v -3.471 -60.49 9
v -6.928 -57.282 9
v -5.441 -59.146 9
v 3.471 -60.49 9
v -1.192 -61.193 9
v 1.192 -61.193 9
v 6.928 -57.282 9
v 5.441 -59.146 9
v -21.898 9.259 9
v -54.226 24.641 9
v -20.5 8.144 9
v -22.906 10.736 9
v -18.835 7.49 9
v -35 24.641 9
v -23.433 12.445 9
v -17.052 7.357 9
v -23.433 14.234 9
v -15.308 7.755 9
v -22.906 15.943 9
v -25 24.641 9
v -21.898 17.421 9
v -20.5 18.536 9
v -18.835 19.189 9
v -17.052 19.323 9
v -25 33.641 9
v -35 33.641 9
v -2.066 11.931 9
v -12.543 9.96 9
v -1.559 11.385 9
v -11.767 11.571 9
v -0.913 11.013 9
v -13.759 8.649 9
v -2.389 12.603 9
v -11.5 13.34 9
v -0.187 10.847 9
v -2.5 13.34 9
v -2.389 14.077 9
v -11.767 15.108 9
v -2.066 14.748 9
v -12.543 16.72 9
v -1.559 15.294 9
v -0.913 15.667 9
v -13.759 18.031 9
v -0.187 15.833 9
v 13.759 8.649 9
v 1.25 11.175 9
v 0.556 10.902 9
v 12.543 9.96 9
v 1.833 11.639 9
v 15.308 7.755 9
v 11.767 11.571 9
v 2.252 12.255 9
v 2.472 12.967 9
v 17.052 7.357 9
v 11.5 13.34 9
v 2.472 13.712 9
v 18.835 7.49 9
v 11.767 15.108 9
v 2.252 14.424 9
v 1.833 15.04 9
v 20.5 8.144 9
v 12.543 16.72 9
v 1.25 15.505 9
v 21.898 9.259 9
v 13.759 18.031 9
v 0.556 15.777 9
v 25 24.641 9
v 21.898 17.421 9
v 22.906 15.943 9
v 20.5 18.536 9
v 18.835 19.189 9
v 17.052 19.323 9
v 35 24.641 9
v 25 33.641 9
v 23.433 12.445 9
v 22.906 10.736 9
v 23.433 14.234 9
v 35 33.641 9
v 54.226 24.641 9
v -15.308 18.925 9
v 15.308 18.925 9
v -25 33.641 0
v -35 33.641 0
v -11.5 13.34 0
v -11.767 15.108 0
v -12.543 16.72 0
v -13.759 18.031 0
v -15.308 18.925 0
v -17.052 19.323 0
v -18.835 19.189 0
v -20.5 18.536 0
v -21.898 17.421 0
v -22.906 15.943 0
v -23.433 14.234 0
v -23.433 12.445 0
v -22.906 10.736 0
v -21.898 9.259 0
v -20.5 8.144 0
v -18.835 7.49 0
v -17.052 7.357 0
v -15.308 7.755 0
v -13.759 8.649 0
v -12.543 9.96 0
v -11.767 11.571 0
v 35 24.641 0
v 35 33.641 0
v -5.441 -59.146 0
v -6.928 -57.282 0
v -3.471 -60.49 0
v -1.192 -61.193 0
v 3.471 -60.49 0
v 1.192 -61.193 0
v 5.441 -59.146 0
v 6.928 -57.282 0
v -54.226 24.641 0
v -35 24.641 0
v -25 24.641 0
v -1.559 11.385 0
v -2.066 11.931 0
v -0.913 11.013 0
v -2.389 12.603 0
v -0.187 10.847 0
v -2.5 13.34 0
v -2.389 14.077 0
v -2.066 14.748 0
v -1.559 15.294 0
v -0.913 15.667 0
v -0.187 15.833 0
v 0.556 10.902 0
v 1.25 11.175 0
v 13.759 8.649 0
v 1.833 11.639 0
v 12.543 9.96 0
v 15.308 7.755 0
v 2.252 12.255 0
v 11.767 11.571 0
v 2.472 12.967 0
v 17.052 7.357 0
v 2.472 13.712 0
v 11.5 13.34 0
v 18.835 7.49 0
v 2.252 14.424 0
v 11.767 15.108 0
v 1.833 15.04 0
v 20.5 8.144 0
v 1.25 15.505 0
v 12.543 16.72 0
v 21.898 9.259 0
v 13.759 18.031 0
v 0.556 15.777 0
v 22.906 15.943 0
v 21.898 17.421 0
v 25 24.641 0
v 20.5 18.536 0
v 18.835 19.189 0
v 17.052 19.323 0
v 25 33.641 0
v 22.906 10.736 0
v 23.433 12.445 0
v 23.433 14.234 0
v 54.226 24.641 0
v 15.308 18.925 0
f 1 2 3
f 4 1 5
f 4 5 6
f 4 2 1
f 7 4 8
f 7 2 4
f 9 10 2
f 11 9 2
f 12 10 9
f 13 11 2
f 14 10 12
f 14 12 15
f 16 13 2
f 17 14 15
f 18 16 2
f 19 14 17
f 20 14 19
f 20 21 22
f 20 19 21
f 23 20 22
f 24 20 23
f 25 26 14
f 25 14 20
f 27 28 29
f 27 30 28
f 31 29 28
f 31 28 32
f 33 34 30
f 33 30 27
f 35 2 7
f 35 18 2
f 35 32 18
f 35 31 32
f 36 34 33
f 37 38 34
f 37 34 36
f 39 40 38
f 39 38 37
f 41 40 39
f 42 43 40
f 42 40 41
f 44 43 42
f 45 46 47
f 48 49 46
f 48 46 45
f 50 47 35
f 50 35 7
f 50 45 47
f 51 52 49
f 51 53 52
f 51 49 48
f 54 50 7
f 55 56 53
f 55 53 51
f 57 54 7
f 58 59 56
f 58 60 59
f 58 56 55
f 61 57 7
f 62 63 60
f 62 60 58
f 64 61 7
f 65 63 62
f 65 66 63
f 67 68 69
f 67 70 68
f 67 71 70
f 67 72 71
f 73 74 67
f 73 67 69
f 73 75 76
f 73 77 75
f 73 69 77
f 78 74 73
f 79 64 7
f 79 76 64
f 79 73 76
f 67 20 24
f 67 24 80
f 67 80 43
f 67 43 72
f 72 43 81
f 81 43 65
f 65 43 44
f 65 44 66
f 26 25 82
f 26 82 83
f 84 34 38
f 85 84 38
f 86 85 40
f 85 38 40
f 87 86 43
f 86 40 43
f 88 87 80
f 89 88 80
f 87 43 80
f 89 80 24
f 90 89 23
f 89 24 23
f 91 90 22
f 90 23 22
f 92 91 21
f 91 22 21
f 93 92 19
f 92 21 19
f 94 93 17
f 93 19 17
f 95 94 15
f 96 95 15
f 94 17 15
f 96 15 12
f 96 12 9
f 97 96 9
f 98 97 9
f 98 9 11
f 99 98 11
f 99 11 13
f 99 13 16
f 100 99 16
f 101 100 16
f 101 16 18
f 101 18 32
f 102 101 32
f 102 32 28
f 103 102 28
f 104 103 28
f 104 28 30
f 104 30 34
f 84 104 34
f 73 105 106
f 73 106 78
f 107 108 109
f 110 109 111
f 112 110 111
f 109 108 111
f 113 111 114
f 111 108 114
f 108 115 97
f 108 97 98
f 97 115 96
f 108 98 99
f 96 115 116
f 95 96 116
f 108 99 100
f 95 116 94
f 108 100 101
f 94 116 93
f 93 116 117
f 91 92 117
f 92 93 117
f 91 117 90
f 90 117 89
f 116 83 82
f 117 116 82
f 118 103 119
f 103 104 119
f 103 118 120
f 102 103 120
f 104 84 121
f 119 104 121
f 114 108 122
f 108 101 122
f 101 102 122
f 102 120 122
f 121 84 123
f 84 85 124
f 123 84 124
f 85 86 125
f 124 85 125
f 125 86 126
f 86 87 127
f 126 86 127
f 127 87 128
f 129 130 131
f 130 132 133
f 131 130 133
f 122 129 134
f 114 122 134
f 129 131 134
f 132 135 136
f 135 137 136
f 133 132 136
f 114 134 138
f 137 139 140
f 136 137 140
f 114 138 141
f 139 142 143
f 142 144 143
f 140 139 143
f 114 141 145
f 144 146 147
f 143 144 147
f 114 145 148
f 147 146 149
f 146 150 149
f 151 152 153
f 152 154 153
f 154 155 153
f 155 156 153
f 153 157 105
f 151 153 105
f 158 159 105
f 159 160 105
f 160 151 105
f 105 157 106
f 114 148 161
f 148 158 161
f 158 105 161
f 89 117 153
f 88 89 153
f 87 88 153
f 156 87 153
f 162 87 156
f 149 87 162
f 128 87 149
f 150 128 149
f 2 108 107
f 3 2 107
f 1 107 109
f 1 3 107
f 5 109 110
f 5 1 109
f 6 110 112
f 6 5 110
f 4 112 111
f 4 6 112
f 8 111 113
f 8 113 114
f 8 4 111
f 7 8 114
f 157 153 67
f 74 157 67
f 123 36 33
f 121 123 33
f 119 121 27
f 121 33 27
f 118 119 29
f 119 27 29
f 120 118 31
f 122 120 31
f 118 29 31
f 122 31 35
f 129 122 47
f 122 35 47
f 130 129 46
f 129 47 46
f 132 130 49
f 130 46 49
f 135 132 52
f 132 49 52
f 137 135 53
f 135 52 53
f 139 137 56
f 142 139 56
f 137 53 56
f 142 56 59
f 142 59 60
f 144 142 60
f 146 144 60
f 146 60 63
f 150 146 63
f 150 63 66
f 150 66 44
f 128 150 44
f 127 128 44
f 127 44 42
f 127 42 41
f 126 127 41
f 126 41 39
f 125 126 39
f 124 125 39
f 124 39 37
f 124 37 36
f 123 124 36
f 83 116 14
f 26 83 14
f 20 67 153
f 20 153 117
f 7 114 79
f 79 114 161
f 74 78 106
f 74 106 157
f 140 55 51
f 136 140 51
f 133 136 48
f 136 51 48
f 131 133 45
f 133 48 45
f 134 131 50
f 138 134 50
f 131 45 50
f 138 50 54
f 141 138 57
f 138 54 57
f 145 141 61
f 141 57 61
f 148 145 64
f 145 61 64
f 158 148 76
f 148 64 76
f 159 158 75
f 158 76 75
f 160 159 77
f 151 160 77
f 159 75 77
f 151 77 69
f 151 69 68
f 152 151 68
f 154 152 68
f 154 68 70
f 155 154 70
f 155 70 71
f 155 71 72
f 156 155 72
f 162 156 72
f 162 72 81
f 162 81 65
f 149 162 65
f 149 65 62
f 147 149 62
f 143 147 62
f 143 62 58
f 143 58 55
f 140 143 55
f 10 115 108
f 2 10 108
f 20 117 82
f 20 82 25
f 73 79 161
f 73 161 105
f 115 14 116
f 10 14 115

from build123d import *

# Parameters (mm, degrees)
F1_DEPTH  = 9
F2_R      = 8
F4_DEPTH  = 25
F5_W      = 120
F5_H      = 9
F6_DEPTH  = 10
F7_W      = 10
F7_H      = 9
F8_DEPTH  = 9
F10_DEPTH = 25


with BuildPart() as f1:
    # F0 (on Top) → F1 (new body)
    with BuildSketch(Plane.XY):
        Polygon((60, 34.6410161514), (-60, 34.6410161514), (0, -69.2820323028), align=None)
    extrude(amount=F1_DEPTH)

    # F2
    f2_edges = [f1.edges().sort_by_distance(p)[0] for p in [
        (0, -69.282032, 4.5),
    ]]
    fillet(f2_edges, radius=F2_R)

    # F3 (on face) → F4 (cut)
    with BuildSketch(Plane.XY.offset(9)):
        with BuildLine():
            Line((11.5, 13.3397459622), (23.5, 13.3397459622))
            ThreePointArc((23.5, 13.3397459622), (17.5, 19.3397459622), (11.5, 13.3397459622))
        make_face()
        with BuildLine():
            ThreePointArc((-23.5, 13.3397459622), (-17.5, 7.3397459622), (-11.5, 13.3397459622))
            Line((-11.5, 13.3397459622), (-23.5, 13.3397459622))
        make_face()
        with BuildLine():
            Line((-23.5, 13.3397459622), (-11.5, 13.3397459622))
            ThreePointArc((-11.5, 13.3397459622), (-17.5, 19.3397459622), (-23.5, 13.3397459622))
        make_face()
        with BuildLine():
            ThreePointArc((11.5, 13.3397459622), (17.5, 7.3397459622), (23.5, 13.3397459622))
            Line((23.5, 13.3397459622), (11.5, 13.3397459622))
        make_face()
    extrude(amount=-F4_DEPTH, mode=Mode.SUBTRACT)

    # F5 (on face) → F6 (cut)
    with BuildSketch(Plane(origin=(0, 34.6410161514, 0), x_dir=(-1, 0, 0), z_dir=(0, 1, 0))):
        with Locations((0, 4.5)):
            Rectangle(F5_W, F5_H)
    extrude(amount=-F6_DEPTH, mode=Mode.SUBTRACT)

    # F7 (on face) → F8 (join)
    with BuildSketch(Plane(origin=(0, 24.6410161514, 0), x_dir=(-1, 0, 0), z_dir=(0, 1, 0))):
        with Locations((-30, 4.5)):
            Rectangle(F7_W, F7_H)
        with Locations((30, 4.5)):
            Rectangle(F7_W, F7_H)
    extrude(amount=F8_DEPTH)

    # F9 (on face) → F10 (cut)
    with BuildSketch(Plane.XY.offset(9)):
        with BuildLine():
            ThreePointArc((2.5, 13.3397459622), (0, 15.8397459622), (-2.5, 13.3397459622))
            Line((-2.5, 13.3397459622), (2.5, 13.3397459622))
        make_face()
        with BuildLine():
            Line((2.5, 13.3397459622), (-2.5, 13.3397459622))
            ThreePointArc((-2.5, 13.3397459622), (0, 10.8397459622), (2.5, 13.3397459622))
        make_face()
    extrude(amount=-F10_DEPTH, mode=Mode.SUBTRACT)


solid = f1.part
